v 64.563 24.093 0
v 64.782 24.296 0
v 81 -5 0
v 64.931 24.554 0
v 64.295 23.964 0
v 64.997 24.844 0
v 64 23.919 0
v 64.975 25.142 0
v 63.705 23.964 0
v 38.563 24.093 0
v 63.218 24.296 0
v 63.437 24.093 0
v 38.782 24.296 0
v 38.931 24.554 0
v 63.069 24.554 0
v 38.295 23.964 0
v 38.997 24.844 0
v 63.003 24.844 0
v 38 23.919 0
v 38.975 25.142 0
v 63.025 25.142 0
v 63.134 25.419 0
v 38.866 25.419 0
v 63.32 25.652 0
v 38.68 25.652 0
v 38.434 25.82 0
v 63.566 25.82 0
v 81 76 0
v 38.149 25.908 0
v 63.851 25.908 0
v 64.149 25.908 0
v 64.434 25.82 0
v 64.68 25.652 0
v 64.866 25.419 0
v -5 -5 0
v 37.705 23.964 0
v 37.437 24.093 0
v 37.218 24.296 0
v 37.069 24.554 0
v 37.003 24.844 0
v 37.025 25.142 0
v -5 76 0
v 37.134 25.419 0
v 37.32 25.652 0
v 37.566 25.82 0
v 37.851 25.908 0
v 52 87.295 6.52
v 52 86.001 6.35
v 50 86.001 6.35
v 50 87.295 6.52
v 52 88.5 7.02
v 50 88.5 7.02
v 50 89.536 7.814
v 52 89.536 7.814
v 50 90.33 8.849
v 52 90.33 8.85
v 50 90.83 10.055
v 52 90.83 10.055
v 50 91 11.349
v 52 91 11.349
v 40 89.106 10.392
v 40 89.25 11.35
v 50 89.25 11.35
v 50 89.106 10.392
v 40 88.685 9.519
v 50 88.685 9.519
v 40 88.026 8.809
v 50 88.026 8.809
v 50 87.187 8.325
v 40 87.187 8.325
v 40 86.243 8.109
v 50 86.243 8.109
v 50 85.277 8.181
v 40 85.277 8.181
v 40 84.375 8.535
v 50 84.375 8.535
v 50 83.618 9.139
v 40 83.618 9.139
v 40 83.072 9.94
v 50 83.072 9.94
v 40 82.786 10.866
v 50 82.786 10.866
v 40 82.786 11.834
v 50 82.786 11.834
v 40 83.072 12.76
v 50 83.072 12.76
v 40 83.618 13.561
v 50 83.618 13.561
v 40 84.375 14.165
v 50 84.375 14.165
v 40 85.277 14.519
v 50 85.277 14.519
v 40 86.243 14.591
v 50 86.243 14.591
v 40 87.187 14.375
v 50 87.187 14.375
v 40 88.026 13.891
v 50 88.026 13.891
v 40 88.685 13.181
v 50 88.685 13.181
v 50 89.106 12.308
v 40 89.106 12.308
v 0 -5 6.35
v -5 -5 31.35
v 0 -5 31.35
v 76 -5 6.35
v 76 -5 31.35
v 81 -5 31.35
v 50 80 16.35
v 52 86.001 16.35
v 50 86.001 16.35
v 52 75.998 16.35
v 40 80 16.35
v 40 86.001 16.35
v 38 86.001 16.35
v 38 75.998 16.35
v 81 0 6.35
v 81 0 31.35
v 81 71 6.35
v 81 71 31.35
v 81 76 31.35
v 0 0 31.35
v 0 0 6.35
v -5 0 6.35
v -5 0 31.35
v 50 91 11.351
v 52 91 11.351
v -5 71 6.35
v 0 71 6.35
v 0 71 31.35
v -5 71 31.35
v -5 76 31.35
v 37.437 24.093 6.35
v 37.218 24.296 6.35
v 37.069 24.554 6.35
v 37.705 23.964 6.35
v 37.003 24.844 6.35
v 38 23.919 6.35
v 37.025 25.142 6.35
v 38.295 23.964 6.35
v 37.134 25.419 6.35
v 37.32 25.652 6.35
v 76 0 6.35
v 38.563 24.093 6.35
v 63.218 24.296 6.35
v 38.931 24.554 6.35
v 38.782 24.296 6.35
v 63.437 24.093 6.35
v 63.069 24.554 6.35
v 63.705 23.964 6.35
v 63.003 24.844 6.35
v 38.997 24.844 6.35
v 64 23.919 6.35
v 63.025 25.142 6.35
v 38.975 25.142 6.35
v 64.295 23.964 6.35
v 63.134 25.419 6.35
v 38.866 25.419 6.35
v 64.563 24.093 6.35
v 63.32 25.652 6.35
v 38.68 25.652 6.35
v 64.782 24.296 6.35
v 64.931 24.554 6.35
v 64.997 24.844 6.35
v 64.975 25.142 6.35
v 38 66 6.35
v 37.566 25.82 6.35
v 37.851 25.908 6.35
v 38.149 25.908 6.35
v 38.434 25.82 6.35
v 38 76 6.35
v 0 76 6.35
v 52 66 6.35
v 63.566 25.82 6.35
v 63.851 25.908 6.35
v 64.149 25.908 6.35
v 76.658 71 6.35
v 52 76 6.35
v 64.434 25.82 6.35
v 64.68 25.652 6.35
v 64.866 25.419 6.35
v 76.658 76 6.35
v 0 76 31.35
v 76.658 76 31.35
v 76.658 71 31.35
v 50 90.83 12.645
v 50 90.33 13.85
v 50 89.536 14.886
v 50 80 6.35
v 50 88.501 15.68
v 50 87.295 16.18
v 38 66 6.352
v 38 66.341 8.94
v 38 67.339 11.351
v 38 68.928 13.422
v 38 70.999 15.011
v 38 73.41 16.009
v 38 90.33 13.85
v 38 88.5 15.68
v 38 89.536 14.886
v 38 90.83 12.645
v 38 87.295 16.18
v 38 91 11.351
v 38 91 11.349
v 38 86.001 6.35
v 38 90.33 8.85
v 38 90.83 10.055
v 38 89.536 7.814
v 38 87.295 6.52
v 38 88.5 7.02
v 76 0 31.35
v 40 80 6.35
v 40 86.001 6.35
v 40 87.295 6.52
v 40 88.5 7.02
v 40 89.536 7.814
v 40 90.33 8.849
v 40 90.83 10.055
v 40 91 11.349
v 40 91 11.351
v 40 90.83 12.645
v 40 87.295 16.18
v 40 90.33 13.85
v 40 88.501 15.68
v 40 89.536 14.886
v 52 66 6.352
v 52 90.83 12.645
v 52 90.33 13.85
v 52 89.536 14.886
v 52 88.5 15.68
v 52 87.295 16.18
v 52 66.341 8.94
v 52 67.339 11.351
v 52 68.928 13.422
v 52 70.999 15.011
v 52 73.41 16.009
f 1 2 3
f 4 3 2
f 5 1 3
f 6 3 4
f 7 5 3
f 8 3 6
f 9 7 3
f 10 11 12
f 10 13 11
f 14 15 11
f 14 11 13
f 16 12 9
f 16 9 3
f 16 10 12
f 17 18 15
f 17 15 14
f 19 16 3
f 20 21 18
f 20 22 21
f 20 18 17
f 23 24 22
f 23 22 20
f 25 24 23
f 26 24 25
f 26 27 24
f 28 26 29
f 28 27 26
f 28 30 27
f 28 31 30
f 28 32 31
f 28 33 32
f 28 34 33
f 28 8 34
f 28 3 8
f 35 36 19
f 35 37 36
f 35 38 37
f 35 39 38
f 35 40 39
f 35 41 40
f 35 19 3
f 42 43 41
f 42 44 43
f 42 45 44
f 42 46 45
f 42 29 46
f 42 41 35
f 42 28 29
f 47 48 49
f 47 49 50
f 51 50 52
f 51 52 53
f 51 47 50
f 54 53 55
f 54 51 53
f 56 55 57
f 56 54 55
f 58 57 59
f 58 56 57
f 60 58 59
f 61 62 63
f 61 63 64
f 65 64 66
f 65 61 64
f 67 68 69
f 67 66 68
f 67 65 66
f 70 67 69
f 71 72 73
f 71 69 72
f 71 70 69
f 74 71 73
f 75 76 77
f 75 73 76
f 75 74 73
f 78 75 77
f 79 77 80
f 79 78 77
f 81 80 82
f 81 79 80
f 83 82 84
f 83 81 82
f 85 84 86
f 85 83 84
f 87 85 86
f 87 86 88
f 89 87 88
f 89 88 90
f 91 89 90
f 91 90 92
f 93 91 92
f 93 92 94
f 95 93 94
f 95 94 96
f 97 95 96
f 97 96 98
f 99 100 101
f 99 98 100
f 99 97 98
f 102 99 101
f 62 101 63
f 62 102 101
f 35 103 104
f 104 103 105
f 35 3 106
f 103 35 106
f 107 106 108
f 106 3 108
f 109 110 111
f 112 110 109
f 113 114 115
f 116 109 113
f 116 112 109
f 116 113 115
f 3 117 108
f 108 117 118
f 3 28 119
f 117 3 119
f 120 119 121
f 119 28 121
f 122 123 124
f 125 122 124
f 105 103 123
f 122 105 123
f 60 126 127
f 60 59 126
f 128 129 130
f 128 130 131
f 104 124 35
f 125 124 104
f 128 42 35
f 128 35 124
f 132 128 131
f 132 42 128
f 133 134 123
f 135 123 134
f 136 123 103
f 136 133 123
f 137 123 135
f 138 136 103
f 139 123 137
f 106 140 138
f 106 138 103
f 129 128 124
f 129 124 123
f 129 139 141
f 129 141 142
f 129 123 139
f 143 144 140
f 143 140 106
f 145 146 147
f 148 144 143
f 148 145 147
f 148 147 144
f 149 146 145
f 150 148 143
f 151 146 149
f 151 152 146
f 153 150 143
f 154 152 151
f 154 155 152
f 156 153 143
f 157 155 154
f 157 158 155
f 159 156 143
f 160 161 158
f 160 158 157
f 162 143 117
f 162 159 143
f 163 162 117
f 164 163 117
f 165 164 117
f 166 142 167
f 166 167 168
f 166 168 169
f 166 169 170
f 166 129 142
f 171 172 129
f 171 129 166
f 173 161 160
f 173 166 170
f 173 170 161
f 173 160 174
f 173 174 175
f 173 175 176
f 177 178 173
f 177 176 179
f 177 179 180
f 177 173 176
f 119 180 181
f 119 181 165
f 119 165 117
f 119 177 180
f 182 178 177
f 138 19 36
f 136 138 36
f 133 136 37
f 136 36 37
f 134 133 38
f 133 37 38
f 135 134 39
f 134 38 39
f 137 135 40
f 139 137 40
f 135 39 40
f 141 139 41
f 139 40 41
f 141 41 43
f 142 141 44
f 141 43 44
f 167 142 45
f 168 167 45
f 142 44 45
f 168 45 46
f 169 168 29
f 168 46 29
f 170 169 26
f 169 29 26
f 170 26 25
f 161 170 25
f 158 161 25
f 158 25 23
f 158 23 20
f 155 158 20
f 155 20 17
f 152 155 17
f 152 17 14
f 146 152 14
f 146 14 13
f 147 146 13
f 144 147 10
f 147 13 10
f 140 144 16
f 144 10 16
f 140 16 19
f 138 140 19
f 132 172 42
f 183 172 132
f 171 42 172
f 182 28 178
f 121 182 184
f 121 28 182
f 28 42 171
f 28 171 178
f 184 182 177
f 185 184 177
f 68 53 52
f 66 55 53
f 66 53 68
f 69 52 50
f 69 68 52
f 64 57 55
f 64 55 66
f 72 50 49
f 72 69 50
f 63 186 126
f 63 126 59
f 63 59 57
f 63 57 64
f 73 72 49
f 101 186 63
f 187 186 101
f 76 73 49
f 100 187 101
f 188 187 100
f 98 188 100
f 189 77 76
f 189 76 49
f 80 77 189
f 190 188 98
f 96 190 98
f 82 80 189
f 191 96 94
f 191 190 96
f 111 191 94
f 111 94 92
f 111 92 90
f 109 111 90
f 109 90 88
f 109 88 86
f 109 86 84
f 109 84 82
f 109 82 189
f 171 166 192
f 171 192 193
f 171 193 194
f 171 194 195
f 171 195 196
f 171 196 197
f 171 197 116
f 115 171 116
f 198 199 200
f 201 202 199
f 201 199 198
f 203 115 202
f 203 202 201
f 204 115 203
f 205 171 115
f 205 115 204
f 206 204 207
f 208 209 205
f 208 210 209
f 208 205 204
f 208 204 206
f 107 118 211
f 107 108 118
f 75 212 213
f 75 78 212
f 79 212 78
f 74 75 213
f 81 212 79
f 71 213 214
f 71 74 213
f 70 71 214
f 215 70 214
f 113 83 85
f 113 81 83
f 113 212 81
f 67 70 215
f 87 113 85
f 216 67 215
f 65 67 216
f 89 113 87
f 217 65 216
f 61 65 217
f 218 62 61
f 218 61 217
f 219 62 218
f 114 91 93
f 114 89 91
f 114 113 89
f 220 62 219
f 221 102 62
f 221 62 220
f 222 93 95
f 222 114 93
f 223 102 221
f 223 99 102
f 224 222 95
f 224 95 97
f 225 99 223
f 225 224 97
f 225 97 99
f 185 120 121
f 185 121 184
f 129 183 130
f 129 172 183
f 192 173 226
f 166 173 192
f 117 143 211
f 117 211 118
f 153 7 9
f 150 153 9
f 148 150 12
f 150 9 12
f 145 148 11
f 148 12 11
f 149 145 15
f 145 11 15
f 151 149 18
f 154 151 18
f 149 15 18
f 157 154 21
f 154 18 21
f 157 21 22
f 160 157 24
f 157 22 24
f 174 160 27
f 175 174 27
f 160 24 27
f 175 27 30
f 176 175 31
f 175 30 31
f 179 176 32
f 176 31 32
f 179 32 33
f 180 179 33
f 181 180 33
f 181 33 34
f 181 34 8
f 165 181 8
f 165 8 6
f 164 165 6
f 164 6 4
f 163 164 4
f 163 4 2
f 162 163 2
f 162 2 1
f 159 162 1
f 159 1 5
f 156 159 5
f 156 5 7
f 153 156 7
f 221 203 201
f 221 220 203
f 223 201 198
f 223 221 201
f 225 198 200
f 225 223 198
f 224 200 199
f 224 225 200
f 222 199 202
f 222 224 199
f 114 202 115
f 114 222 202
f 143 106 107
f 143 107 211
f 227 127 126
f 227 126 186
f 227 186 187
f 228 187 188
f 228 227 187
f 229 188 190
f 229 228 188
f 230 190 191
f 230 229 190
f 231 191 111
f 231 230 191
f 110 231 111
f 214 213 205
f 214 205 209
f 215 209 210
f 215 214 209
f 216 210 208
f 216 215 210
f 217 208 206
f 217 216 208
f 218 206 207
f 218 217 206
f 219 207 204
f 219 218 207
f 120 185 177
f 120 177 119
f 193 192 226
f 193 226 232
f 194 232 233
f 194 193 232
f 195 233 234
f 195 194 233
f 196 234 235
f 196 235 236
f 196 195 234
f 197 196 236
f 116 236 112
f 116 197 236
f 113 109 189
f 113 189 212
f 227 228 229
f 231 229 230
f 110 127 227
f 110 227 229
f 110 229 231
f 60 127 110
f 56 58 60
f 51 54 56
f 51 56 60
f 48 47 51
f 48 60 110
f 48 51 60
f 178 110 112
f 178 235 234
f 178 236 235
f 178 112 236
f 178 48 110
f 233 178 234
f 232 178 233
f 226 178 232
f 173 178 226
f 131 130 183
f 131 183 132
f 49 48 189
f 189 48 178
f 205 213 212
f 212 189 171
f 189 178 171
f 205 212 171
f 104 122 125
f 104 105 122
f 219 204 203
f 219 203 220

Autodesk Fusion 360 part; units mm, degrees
sketch "Sketch1" plane through (0, 0, 0) normal (0, 0, 1) x (1, 0, 0)
  line L0 (0, 0) -> (76, 0)
  line L1 (76, 0) -> (76, 76)
  line L2 (76, 76) -> (0, 76)
  line L3 (0, 76) -> (0, 0)
  dimension "d1" = 76
  dimension "d2" = 76
extrude "Extrude1" add sketch "Sketch1" along normal blind 6.35
sketch "Sketch2" plane through (0, 0, 6.35) normal (0, 0, 1) x (-1, 0, 0)
  line L0 (0, -76) -> (0, 0)
  line L1 (0, 0) -> (-76, 0)
  line L2 (-76, 0) -> (-76, -76)
  line L3 (-76, -76) -> (0, -76)
  line L4 (-52, -66) -> (-38, -66)
  line L5 (-38, -66) -> (-38, -91)
  line L6 (-38, -91) -> (-52, -91)
  line L7 (-52, -91) -> (-52, -66)
  dimension "d5" = 14
  dimension "d6" = 25
  dimension "d7" = 24
  dimension "d8" = 10
extrude "Extrude2" add sketch "Sketch2" along normal blind 10 contours L3 L5 L6 L7 | L3 L4 L5 L7
fillet "Fillet1" radius 10 1 edges at (45, 66, 16.35)
fillet "Fillet2" radius 5 2 edges at (45, 91, 16.35) (45, 91, 6.35)
sketch "Sketch3" plane through (0, 0, 16.35) normal (0, 0, 1) x (-1, 0, 0)
  line L0 (-52, -86) -> (-38, -86)
  line L1 (-38, -86) -> (-38, -76)
  line L2 (-38, -76) -> (-52, -76)
  line L3 (-52, -76) -> (-52, -86)
  line L4 (-50, -80) -> (-40, -80)
  line L5 (-40, -80) -> (-40, -95)
  line L6 (-40, -95) -> (-50, -95)
  line L7 (-50, -95) -> (-50, -80)
extrude "Extrude3" cut sketch "Sketch3" against normal blind 20 contours L0 L4 L5 L7 | L0 L5 L6 L7
sketch "Sketch4" plane through (40, 0, 0) normal (1, 0, 0) x (0, 1, 0)
  line L0 (80, 6.35) -> (86, 6.35)
  arc A0 (86, 6.35) -> (86, 16.35) centre (86, 11.35) ccw
  line L1 (86, 16.35) -> (80, 16.35)
  line L2 (80, 16.35) -> (80, 6.35)
  circle A1 centre (86, 11.35) radius 3.25
  dimension "d17" = 6.5
extrude "Extrude4" add sketch "Sketch4" along normal blind 10 contours A1
extrude "Extrude5" add 1 faces at (76, 25.3333, 2.1167) along direction (1, 0, 0) blind 5
extrude "Extrude6" add 1 faces at (0, 50.6667, 2.1167) along direction (-1, 0, 0) blind 5
extrude "Extrude7" add 1 faces at (23.6667, 0, 2.1167) along direction (0, -1, 0) blind 5
sketch "Sketch5" plane through (0, 0, 6.35) normal (0, 0, 1) x (-1, 0, 0)
  line L0 (-38, -66) -> (-38, -76)
  line L1 (-38, -76) -> (5, -76)
  line L2 (5, -76) -> (5, 5)
  line L3 (5, 5) -> (-81, 5)
  line L4 (-81, 5) -> (-81, -76)
  line L5 (-81, -76) -> (-52, -76)
  line L6 (-52, -76) -> (-52, -66)
  line L7 (-52, -66) -> (-38, -66)
  line L8 (-81, -76) -> (-76.6575, -76)
  line L9 (-76.6575, -76) -> (-76.6575, -71)
  line L10 (-76.6575, -71) -> (-81, -71)
  line L11 (-81, -71) -> (-81, -76)
  line L12 (5, -76) -> (0, -76)
  line L13 (0, -76) -> (0, -71)
  line L14 (0, -71) -> (5, -71)
  line L15 (5, -71) -> (5, -76)
  line L16 (5, 5) -> (0, 5)
  line L17 (0, 5) -> (0, 0)
  line L18 (0, 0) -> (5, 0)
  line L19 (5, 0) -> (5, 5)
  line L20 (-81, 5) -> (-76, 5)
  line L21 (-76, 5) -> (-76, 0)
  line L22 (-76, 0) -> (-81, 0)
  line L23 (-81, 0) -> (-81, 5)
  dimension "d26" = 5
  dimension "d27" = 5
  dimension "d28" = 5
  dimension "d29" = 5
  dimension "d30" = 5
  dimension "d31" = 5
  dimension "d32" = 5
extrude "Extrude8" add sketch "Sketch5" along normal blind 25 contours L1 L2 L12 L13 L14 L15 | L4 L5 L8 L9 L10 L11 | L2 L3 L16 L17 L18 L19 | L3 L4 L20 L21 L22 L23
sketch "Sketch7" plane through (0, 0, 6.35) normal (0, 0, 1) x (-1, 0, 0)
  line L0 (0, 0) -> (0, 5)
  line L1 (0, 5) -> (-76, 5)
  line L2 (-76, 5) -> (-76, 0)
  line L3 (-76, 0) -> (-81, 0)
  line L4 (-81, 0) -> (-81, -71)
  line L5 (-81, -71) -> (-76.6575, -71)
  line L6 (-76.6575, -71) -> (-76.6575, -76)
  line L7 (-76.6575, -76) -> (-52, -76)
  line L8 (-52, -76) -> (-52, -66)
  line L9 (-52, -66) -> (-38, -66)
  line L10 (-38, -66) -> (-38, -76)
  line L11 (-38, -76) -> (0, -76)
  line L12 (0, -76) -> (0, -71)
  line L13 (0, -71) -> (5, -71)
  line L14 (5, -71) -> (5, 0)
  line L15 (5, 0) -> (0, 0)
  circle A0 centre (-38, -24.9192) radius 1
  circle A1 centre (-64, -24.9192) radius 1
  dimension "d35" = 2
  dimension "d36" = 2
  dimension "d39" = 26
hole "Hole1" at (64, 24.9192, 6.35) at (38, 24.9192, 6.35) direction (0, 0, -1) diameter 2 end through all
